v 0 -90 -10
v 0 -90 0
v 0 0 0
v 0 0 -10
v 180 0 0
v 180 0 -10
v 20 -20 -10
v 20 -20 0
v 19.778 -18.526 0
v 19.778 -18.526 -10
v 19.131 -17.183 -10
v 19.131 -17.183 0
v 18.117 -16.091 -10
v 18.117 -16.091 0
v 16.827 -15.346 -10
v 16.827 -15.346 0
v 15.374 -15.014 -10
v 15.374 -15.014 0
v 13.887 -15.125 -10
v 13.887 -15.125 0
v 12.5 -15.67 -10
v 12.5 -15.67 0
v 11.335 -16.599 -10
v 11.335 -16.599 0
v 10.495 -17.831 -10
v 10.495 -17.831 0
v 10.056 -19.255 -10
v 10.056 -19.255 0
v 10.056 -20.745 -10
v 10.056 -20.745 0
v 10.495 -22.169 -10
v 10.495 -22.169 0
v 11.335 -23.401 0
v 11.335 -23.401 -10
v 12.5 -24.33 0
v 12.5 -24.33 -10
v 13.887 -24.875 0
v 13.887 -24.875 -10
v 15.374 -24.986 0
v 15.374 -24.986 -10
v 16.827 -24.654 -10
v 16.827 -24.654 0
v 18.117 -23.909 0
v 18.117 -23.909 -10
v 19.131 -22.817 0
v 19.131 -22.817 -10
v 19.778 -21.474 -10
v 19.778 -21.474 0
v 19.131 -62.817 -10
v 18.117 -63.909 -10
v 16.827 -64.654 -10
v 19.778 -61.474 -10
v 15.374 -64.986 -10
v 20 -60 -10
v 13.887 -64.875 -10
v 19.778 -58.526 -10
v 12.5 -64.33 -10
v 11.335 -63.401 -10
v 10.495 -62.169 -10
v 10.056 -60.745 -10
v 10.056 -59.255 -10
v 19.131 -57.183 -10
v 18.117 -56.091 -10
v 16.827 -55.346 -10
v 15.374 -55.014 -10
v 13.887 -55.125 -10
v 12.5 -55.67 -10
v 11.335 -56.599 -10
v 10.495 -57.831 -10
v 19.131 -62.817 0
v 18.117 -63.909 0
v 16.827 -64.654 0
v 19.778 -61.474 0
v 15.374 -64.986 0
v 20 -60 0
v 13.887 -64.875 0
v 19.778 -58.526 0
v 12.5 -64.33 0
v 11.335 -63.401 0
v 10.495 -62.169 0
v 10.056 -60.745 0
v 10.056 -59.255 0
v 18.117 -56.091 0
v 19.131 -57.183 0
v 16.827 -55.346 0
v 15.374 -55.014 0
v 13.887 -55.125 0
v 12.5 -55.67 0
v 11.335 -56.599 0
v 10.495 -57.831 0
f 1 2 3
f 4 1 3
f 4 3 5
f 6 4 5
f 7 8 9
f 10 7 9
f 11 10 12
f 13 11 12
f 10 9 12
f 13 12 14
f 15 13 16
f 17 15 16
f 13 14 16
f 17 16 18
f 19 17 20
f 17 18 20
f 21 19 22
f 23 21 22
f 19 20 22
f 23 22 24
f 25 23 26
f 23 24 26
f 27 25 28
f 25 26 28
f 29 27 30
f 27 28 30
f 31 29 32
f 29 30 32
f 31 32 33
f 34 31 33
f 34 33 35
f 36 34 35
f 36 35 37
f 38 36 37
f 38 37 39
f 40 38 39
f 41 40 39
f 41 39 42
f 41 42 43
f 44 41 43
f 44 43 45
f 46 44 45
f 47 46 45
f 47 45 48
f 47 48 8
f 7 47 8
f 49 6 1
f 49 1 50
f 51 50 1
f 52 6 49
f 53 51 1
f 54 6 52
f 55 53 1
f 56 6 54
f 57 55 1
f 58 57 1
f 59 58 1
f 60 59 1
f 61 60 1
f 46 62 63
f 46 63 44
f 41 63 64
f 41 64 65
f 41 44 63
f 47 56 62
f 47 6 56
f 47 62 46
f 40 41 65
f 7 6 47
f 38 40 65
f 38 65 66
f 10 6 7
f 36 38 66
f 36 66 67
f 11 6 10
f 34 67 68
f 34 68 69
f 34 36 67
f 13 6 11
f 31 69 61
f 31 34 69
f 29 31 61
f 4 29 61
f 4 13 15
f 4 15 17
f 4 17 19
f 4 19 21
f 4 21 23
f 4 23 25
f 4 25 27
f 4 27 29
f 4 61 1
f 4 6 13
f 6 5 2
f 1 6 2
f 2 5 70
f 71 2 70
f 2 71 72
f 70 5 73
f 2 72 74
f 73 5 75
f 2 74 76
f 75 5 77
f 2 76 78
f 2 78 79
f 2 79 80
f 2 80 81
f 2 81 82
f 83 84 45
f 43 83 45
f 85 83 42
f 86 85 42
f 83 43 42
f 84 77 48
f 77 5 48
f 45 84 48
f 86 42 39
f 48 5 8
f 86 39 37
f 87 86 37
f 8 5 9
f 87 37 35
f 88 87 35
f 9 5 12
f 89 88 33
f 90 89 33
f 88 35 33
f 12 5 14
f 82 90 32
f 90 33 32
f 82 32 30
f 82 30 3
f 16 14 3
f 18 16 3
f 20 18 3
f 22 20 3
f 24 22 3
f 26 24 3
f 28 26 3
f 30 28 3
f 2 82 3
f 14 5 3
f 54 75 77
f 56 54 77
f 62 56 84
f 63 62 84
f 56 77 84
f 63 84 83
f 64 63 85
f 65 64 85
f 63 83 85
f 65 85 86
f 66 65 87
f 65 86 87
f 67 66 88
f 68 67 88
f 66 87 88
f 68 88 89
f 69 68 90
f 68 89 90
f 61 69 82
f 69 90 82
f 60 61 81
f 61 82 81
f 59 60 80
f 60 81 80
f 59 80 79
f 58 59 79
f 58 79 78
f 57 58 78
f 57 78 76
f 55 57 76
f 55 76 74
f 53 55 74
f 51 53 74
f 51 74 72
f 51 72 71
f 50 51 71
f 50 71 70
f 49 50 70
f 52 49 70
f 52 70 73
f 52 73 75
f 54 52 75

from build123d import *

# Parameters (mm, degrees)
BOSS_EXTRUDE2_DEPTH = 10
SKETCH6_R           = 5
CUT_EXTRUDE2_DEPTH  = 202.494416796


with BuildPart() as part:
    # Sketch5 → Boss-Extrude2 (new body)
    with BuildSketch(Plane.XY):
        Polygon((0, 0), (180, 0), (0, -90), align=None)
    extrude(amount=-BOSS_EXTRUDE2_DEPTH)

    # Sketch6 → Cut-Extrude2 (cut, through all)
    with BuildSketch(Plane.XY):
        with Locations((15, -20)):
            Circle(SKETCH6_R)
        with Locations((15, -60)):
            Circle(SKETCH6_R)
    extrude(amount=-CUT_EXTRUDE2_DEPTH, mode=Mode.SUBTRACT)


solid = part.part
